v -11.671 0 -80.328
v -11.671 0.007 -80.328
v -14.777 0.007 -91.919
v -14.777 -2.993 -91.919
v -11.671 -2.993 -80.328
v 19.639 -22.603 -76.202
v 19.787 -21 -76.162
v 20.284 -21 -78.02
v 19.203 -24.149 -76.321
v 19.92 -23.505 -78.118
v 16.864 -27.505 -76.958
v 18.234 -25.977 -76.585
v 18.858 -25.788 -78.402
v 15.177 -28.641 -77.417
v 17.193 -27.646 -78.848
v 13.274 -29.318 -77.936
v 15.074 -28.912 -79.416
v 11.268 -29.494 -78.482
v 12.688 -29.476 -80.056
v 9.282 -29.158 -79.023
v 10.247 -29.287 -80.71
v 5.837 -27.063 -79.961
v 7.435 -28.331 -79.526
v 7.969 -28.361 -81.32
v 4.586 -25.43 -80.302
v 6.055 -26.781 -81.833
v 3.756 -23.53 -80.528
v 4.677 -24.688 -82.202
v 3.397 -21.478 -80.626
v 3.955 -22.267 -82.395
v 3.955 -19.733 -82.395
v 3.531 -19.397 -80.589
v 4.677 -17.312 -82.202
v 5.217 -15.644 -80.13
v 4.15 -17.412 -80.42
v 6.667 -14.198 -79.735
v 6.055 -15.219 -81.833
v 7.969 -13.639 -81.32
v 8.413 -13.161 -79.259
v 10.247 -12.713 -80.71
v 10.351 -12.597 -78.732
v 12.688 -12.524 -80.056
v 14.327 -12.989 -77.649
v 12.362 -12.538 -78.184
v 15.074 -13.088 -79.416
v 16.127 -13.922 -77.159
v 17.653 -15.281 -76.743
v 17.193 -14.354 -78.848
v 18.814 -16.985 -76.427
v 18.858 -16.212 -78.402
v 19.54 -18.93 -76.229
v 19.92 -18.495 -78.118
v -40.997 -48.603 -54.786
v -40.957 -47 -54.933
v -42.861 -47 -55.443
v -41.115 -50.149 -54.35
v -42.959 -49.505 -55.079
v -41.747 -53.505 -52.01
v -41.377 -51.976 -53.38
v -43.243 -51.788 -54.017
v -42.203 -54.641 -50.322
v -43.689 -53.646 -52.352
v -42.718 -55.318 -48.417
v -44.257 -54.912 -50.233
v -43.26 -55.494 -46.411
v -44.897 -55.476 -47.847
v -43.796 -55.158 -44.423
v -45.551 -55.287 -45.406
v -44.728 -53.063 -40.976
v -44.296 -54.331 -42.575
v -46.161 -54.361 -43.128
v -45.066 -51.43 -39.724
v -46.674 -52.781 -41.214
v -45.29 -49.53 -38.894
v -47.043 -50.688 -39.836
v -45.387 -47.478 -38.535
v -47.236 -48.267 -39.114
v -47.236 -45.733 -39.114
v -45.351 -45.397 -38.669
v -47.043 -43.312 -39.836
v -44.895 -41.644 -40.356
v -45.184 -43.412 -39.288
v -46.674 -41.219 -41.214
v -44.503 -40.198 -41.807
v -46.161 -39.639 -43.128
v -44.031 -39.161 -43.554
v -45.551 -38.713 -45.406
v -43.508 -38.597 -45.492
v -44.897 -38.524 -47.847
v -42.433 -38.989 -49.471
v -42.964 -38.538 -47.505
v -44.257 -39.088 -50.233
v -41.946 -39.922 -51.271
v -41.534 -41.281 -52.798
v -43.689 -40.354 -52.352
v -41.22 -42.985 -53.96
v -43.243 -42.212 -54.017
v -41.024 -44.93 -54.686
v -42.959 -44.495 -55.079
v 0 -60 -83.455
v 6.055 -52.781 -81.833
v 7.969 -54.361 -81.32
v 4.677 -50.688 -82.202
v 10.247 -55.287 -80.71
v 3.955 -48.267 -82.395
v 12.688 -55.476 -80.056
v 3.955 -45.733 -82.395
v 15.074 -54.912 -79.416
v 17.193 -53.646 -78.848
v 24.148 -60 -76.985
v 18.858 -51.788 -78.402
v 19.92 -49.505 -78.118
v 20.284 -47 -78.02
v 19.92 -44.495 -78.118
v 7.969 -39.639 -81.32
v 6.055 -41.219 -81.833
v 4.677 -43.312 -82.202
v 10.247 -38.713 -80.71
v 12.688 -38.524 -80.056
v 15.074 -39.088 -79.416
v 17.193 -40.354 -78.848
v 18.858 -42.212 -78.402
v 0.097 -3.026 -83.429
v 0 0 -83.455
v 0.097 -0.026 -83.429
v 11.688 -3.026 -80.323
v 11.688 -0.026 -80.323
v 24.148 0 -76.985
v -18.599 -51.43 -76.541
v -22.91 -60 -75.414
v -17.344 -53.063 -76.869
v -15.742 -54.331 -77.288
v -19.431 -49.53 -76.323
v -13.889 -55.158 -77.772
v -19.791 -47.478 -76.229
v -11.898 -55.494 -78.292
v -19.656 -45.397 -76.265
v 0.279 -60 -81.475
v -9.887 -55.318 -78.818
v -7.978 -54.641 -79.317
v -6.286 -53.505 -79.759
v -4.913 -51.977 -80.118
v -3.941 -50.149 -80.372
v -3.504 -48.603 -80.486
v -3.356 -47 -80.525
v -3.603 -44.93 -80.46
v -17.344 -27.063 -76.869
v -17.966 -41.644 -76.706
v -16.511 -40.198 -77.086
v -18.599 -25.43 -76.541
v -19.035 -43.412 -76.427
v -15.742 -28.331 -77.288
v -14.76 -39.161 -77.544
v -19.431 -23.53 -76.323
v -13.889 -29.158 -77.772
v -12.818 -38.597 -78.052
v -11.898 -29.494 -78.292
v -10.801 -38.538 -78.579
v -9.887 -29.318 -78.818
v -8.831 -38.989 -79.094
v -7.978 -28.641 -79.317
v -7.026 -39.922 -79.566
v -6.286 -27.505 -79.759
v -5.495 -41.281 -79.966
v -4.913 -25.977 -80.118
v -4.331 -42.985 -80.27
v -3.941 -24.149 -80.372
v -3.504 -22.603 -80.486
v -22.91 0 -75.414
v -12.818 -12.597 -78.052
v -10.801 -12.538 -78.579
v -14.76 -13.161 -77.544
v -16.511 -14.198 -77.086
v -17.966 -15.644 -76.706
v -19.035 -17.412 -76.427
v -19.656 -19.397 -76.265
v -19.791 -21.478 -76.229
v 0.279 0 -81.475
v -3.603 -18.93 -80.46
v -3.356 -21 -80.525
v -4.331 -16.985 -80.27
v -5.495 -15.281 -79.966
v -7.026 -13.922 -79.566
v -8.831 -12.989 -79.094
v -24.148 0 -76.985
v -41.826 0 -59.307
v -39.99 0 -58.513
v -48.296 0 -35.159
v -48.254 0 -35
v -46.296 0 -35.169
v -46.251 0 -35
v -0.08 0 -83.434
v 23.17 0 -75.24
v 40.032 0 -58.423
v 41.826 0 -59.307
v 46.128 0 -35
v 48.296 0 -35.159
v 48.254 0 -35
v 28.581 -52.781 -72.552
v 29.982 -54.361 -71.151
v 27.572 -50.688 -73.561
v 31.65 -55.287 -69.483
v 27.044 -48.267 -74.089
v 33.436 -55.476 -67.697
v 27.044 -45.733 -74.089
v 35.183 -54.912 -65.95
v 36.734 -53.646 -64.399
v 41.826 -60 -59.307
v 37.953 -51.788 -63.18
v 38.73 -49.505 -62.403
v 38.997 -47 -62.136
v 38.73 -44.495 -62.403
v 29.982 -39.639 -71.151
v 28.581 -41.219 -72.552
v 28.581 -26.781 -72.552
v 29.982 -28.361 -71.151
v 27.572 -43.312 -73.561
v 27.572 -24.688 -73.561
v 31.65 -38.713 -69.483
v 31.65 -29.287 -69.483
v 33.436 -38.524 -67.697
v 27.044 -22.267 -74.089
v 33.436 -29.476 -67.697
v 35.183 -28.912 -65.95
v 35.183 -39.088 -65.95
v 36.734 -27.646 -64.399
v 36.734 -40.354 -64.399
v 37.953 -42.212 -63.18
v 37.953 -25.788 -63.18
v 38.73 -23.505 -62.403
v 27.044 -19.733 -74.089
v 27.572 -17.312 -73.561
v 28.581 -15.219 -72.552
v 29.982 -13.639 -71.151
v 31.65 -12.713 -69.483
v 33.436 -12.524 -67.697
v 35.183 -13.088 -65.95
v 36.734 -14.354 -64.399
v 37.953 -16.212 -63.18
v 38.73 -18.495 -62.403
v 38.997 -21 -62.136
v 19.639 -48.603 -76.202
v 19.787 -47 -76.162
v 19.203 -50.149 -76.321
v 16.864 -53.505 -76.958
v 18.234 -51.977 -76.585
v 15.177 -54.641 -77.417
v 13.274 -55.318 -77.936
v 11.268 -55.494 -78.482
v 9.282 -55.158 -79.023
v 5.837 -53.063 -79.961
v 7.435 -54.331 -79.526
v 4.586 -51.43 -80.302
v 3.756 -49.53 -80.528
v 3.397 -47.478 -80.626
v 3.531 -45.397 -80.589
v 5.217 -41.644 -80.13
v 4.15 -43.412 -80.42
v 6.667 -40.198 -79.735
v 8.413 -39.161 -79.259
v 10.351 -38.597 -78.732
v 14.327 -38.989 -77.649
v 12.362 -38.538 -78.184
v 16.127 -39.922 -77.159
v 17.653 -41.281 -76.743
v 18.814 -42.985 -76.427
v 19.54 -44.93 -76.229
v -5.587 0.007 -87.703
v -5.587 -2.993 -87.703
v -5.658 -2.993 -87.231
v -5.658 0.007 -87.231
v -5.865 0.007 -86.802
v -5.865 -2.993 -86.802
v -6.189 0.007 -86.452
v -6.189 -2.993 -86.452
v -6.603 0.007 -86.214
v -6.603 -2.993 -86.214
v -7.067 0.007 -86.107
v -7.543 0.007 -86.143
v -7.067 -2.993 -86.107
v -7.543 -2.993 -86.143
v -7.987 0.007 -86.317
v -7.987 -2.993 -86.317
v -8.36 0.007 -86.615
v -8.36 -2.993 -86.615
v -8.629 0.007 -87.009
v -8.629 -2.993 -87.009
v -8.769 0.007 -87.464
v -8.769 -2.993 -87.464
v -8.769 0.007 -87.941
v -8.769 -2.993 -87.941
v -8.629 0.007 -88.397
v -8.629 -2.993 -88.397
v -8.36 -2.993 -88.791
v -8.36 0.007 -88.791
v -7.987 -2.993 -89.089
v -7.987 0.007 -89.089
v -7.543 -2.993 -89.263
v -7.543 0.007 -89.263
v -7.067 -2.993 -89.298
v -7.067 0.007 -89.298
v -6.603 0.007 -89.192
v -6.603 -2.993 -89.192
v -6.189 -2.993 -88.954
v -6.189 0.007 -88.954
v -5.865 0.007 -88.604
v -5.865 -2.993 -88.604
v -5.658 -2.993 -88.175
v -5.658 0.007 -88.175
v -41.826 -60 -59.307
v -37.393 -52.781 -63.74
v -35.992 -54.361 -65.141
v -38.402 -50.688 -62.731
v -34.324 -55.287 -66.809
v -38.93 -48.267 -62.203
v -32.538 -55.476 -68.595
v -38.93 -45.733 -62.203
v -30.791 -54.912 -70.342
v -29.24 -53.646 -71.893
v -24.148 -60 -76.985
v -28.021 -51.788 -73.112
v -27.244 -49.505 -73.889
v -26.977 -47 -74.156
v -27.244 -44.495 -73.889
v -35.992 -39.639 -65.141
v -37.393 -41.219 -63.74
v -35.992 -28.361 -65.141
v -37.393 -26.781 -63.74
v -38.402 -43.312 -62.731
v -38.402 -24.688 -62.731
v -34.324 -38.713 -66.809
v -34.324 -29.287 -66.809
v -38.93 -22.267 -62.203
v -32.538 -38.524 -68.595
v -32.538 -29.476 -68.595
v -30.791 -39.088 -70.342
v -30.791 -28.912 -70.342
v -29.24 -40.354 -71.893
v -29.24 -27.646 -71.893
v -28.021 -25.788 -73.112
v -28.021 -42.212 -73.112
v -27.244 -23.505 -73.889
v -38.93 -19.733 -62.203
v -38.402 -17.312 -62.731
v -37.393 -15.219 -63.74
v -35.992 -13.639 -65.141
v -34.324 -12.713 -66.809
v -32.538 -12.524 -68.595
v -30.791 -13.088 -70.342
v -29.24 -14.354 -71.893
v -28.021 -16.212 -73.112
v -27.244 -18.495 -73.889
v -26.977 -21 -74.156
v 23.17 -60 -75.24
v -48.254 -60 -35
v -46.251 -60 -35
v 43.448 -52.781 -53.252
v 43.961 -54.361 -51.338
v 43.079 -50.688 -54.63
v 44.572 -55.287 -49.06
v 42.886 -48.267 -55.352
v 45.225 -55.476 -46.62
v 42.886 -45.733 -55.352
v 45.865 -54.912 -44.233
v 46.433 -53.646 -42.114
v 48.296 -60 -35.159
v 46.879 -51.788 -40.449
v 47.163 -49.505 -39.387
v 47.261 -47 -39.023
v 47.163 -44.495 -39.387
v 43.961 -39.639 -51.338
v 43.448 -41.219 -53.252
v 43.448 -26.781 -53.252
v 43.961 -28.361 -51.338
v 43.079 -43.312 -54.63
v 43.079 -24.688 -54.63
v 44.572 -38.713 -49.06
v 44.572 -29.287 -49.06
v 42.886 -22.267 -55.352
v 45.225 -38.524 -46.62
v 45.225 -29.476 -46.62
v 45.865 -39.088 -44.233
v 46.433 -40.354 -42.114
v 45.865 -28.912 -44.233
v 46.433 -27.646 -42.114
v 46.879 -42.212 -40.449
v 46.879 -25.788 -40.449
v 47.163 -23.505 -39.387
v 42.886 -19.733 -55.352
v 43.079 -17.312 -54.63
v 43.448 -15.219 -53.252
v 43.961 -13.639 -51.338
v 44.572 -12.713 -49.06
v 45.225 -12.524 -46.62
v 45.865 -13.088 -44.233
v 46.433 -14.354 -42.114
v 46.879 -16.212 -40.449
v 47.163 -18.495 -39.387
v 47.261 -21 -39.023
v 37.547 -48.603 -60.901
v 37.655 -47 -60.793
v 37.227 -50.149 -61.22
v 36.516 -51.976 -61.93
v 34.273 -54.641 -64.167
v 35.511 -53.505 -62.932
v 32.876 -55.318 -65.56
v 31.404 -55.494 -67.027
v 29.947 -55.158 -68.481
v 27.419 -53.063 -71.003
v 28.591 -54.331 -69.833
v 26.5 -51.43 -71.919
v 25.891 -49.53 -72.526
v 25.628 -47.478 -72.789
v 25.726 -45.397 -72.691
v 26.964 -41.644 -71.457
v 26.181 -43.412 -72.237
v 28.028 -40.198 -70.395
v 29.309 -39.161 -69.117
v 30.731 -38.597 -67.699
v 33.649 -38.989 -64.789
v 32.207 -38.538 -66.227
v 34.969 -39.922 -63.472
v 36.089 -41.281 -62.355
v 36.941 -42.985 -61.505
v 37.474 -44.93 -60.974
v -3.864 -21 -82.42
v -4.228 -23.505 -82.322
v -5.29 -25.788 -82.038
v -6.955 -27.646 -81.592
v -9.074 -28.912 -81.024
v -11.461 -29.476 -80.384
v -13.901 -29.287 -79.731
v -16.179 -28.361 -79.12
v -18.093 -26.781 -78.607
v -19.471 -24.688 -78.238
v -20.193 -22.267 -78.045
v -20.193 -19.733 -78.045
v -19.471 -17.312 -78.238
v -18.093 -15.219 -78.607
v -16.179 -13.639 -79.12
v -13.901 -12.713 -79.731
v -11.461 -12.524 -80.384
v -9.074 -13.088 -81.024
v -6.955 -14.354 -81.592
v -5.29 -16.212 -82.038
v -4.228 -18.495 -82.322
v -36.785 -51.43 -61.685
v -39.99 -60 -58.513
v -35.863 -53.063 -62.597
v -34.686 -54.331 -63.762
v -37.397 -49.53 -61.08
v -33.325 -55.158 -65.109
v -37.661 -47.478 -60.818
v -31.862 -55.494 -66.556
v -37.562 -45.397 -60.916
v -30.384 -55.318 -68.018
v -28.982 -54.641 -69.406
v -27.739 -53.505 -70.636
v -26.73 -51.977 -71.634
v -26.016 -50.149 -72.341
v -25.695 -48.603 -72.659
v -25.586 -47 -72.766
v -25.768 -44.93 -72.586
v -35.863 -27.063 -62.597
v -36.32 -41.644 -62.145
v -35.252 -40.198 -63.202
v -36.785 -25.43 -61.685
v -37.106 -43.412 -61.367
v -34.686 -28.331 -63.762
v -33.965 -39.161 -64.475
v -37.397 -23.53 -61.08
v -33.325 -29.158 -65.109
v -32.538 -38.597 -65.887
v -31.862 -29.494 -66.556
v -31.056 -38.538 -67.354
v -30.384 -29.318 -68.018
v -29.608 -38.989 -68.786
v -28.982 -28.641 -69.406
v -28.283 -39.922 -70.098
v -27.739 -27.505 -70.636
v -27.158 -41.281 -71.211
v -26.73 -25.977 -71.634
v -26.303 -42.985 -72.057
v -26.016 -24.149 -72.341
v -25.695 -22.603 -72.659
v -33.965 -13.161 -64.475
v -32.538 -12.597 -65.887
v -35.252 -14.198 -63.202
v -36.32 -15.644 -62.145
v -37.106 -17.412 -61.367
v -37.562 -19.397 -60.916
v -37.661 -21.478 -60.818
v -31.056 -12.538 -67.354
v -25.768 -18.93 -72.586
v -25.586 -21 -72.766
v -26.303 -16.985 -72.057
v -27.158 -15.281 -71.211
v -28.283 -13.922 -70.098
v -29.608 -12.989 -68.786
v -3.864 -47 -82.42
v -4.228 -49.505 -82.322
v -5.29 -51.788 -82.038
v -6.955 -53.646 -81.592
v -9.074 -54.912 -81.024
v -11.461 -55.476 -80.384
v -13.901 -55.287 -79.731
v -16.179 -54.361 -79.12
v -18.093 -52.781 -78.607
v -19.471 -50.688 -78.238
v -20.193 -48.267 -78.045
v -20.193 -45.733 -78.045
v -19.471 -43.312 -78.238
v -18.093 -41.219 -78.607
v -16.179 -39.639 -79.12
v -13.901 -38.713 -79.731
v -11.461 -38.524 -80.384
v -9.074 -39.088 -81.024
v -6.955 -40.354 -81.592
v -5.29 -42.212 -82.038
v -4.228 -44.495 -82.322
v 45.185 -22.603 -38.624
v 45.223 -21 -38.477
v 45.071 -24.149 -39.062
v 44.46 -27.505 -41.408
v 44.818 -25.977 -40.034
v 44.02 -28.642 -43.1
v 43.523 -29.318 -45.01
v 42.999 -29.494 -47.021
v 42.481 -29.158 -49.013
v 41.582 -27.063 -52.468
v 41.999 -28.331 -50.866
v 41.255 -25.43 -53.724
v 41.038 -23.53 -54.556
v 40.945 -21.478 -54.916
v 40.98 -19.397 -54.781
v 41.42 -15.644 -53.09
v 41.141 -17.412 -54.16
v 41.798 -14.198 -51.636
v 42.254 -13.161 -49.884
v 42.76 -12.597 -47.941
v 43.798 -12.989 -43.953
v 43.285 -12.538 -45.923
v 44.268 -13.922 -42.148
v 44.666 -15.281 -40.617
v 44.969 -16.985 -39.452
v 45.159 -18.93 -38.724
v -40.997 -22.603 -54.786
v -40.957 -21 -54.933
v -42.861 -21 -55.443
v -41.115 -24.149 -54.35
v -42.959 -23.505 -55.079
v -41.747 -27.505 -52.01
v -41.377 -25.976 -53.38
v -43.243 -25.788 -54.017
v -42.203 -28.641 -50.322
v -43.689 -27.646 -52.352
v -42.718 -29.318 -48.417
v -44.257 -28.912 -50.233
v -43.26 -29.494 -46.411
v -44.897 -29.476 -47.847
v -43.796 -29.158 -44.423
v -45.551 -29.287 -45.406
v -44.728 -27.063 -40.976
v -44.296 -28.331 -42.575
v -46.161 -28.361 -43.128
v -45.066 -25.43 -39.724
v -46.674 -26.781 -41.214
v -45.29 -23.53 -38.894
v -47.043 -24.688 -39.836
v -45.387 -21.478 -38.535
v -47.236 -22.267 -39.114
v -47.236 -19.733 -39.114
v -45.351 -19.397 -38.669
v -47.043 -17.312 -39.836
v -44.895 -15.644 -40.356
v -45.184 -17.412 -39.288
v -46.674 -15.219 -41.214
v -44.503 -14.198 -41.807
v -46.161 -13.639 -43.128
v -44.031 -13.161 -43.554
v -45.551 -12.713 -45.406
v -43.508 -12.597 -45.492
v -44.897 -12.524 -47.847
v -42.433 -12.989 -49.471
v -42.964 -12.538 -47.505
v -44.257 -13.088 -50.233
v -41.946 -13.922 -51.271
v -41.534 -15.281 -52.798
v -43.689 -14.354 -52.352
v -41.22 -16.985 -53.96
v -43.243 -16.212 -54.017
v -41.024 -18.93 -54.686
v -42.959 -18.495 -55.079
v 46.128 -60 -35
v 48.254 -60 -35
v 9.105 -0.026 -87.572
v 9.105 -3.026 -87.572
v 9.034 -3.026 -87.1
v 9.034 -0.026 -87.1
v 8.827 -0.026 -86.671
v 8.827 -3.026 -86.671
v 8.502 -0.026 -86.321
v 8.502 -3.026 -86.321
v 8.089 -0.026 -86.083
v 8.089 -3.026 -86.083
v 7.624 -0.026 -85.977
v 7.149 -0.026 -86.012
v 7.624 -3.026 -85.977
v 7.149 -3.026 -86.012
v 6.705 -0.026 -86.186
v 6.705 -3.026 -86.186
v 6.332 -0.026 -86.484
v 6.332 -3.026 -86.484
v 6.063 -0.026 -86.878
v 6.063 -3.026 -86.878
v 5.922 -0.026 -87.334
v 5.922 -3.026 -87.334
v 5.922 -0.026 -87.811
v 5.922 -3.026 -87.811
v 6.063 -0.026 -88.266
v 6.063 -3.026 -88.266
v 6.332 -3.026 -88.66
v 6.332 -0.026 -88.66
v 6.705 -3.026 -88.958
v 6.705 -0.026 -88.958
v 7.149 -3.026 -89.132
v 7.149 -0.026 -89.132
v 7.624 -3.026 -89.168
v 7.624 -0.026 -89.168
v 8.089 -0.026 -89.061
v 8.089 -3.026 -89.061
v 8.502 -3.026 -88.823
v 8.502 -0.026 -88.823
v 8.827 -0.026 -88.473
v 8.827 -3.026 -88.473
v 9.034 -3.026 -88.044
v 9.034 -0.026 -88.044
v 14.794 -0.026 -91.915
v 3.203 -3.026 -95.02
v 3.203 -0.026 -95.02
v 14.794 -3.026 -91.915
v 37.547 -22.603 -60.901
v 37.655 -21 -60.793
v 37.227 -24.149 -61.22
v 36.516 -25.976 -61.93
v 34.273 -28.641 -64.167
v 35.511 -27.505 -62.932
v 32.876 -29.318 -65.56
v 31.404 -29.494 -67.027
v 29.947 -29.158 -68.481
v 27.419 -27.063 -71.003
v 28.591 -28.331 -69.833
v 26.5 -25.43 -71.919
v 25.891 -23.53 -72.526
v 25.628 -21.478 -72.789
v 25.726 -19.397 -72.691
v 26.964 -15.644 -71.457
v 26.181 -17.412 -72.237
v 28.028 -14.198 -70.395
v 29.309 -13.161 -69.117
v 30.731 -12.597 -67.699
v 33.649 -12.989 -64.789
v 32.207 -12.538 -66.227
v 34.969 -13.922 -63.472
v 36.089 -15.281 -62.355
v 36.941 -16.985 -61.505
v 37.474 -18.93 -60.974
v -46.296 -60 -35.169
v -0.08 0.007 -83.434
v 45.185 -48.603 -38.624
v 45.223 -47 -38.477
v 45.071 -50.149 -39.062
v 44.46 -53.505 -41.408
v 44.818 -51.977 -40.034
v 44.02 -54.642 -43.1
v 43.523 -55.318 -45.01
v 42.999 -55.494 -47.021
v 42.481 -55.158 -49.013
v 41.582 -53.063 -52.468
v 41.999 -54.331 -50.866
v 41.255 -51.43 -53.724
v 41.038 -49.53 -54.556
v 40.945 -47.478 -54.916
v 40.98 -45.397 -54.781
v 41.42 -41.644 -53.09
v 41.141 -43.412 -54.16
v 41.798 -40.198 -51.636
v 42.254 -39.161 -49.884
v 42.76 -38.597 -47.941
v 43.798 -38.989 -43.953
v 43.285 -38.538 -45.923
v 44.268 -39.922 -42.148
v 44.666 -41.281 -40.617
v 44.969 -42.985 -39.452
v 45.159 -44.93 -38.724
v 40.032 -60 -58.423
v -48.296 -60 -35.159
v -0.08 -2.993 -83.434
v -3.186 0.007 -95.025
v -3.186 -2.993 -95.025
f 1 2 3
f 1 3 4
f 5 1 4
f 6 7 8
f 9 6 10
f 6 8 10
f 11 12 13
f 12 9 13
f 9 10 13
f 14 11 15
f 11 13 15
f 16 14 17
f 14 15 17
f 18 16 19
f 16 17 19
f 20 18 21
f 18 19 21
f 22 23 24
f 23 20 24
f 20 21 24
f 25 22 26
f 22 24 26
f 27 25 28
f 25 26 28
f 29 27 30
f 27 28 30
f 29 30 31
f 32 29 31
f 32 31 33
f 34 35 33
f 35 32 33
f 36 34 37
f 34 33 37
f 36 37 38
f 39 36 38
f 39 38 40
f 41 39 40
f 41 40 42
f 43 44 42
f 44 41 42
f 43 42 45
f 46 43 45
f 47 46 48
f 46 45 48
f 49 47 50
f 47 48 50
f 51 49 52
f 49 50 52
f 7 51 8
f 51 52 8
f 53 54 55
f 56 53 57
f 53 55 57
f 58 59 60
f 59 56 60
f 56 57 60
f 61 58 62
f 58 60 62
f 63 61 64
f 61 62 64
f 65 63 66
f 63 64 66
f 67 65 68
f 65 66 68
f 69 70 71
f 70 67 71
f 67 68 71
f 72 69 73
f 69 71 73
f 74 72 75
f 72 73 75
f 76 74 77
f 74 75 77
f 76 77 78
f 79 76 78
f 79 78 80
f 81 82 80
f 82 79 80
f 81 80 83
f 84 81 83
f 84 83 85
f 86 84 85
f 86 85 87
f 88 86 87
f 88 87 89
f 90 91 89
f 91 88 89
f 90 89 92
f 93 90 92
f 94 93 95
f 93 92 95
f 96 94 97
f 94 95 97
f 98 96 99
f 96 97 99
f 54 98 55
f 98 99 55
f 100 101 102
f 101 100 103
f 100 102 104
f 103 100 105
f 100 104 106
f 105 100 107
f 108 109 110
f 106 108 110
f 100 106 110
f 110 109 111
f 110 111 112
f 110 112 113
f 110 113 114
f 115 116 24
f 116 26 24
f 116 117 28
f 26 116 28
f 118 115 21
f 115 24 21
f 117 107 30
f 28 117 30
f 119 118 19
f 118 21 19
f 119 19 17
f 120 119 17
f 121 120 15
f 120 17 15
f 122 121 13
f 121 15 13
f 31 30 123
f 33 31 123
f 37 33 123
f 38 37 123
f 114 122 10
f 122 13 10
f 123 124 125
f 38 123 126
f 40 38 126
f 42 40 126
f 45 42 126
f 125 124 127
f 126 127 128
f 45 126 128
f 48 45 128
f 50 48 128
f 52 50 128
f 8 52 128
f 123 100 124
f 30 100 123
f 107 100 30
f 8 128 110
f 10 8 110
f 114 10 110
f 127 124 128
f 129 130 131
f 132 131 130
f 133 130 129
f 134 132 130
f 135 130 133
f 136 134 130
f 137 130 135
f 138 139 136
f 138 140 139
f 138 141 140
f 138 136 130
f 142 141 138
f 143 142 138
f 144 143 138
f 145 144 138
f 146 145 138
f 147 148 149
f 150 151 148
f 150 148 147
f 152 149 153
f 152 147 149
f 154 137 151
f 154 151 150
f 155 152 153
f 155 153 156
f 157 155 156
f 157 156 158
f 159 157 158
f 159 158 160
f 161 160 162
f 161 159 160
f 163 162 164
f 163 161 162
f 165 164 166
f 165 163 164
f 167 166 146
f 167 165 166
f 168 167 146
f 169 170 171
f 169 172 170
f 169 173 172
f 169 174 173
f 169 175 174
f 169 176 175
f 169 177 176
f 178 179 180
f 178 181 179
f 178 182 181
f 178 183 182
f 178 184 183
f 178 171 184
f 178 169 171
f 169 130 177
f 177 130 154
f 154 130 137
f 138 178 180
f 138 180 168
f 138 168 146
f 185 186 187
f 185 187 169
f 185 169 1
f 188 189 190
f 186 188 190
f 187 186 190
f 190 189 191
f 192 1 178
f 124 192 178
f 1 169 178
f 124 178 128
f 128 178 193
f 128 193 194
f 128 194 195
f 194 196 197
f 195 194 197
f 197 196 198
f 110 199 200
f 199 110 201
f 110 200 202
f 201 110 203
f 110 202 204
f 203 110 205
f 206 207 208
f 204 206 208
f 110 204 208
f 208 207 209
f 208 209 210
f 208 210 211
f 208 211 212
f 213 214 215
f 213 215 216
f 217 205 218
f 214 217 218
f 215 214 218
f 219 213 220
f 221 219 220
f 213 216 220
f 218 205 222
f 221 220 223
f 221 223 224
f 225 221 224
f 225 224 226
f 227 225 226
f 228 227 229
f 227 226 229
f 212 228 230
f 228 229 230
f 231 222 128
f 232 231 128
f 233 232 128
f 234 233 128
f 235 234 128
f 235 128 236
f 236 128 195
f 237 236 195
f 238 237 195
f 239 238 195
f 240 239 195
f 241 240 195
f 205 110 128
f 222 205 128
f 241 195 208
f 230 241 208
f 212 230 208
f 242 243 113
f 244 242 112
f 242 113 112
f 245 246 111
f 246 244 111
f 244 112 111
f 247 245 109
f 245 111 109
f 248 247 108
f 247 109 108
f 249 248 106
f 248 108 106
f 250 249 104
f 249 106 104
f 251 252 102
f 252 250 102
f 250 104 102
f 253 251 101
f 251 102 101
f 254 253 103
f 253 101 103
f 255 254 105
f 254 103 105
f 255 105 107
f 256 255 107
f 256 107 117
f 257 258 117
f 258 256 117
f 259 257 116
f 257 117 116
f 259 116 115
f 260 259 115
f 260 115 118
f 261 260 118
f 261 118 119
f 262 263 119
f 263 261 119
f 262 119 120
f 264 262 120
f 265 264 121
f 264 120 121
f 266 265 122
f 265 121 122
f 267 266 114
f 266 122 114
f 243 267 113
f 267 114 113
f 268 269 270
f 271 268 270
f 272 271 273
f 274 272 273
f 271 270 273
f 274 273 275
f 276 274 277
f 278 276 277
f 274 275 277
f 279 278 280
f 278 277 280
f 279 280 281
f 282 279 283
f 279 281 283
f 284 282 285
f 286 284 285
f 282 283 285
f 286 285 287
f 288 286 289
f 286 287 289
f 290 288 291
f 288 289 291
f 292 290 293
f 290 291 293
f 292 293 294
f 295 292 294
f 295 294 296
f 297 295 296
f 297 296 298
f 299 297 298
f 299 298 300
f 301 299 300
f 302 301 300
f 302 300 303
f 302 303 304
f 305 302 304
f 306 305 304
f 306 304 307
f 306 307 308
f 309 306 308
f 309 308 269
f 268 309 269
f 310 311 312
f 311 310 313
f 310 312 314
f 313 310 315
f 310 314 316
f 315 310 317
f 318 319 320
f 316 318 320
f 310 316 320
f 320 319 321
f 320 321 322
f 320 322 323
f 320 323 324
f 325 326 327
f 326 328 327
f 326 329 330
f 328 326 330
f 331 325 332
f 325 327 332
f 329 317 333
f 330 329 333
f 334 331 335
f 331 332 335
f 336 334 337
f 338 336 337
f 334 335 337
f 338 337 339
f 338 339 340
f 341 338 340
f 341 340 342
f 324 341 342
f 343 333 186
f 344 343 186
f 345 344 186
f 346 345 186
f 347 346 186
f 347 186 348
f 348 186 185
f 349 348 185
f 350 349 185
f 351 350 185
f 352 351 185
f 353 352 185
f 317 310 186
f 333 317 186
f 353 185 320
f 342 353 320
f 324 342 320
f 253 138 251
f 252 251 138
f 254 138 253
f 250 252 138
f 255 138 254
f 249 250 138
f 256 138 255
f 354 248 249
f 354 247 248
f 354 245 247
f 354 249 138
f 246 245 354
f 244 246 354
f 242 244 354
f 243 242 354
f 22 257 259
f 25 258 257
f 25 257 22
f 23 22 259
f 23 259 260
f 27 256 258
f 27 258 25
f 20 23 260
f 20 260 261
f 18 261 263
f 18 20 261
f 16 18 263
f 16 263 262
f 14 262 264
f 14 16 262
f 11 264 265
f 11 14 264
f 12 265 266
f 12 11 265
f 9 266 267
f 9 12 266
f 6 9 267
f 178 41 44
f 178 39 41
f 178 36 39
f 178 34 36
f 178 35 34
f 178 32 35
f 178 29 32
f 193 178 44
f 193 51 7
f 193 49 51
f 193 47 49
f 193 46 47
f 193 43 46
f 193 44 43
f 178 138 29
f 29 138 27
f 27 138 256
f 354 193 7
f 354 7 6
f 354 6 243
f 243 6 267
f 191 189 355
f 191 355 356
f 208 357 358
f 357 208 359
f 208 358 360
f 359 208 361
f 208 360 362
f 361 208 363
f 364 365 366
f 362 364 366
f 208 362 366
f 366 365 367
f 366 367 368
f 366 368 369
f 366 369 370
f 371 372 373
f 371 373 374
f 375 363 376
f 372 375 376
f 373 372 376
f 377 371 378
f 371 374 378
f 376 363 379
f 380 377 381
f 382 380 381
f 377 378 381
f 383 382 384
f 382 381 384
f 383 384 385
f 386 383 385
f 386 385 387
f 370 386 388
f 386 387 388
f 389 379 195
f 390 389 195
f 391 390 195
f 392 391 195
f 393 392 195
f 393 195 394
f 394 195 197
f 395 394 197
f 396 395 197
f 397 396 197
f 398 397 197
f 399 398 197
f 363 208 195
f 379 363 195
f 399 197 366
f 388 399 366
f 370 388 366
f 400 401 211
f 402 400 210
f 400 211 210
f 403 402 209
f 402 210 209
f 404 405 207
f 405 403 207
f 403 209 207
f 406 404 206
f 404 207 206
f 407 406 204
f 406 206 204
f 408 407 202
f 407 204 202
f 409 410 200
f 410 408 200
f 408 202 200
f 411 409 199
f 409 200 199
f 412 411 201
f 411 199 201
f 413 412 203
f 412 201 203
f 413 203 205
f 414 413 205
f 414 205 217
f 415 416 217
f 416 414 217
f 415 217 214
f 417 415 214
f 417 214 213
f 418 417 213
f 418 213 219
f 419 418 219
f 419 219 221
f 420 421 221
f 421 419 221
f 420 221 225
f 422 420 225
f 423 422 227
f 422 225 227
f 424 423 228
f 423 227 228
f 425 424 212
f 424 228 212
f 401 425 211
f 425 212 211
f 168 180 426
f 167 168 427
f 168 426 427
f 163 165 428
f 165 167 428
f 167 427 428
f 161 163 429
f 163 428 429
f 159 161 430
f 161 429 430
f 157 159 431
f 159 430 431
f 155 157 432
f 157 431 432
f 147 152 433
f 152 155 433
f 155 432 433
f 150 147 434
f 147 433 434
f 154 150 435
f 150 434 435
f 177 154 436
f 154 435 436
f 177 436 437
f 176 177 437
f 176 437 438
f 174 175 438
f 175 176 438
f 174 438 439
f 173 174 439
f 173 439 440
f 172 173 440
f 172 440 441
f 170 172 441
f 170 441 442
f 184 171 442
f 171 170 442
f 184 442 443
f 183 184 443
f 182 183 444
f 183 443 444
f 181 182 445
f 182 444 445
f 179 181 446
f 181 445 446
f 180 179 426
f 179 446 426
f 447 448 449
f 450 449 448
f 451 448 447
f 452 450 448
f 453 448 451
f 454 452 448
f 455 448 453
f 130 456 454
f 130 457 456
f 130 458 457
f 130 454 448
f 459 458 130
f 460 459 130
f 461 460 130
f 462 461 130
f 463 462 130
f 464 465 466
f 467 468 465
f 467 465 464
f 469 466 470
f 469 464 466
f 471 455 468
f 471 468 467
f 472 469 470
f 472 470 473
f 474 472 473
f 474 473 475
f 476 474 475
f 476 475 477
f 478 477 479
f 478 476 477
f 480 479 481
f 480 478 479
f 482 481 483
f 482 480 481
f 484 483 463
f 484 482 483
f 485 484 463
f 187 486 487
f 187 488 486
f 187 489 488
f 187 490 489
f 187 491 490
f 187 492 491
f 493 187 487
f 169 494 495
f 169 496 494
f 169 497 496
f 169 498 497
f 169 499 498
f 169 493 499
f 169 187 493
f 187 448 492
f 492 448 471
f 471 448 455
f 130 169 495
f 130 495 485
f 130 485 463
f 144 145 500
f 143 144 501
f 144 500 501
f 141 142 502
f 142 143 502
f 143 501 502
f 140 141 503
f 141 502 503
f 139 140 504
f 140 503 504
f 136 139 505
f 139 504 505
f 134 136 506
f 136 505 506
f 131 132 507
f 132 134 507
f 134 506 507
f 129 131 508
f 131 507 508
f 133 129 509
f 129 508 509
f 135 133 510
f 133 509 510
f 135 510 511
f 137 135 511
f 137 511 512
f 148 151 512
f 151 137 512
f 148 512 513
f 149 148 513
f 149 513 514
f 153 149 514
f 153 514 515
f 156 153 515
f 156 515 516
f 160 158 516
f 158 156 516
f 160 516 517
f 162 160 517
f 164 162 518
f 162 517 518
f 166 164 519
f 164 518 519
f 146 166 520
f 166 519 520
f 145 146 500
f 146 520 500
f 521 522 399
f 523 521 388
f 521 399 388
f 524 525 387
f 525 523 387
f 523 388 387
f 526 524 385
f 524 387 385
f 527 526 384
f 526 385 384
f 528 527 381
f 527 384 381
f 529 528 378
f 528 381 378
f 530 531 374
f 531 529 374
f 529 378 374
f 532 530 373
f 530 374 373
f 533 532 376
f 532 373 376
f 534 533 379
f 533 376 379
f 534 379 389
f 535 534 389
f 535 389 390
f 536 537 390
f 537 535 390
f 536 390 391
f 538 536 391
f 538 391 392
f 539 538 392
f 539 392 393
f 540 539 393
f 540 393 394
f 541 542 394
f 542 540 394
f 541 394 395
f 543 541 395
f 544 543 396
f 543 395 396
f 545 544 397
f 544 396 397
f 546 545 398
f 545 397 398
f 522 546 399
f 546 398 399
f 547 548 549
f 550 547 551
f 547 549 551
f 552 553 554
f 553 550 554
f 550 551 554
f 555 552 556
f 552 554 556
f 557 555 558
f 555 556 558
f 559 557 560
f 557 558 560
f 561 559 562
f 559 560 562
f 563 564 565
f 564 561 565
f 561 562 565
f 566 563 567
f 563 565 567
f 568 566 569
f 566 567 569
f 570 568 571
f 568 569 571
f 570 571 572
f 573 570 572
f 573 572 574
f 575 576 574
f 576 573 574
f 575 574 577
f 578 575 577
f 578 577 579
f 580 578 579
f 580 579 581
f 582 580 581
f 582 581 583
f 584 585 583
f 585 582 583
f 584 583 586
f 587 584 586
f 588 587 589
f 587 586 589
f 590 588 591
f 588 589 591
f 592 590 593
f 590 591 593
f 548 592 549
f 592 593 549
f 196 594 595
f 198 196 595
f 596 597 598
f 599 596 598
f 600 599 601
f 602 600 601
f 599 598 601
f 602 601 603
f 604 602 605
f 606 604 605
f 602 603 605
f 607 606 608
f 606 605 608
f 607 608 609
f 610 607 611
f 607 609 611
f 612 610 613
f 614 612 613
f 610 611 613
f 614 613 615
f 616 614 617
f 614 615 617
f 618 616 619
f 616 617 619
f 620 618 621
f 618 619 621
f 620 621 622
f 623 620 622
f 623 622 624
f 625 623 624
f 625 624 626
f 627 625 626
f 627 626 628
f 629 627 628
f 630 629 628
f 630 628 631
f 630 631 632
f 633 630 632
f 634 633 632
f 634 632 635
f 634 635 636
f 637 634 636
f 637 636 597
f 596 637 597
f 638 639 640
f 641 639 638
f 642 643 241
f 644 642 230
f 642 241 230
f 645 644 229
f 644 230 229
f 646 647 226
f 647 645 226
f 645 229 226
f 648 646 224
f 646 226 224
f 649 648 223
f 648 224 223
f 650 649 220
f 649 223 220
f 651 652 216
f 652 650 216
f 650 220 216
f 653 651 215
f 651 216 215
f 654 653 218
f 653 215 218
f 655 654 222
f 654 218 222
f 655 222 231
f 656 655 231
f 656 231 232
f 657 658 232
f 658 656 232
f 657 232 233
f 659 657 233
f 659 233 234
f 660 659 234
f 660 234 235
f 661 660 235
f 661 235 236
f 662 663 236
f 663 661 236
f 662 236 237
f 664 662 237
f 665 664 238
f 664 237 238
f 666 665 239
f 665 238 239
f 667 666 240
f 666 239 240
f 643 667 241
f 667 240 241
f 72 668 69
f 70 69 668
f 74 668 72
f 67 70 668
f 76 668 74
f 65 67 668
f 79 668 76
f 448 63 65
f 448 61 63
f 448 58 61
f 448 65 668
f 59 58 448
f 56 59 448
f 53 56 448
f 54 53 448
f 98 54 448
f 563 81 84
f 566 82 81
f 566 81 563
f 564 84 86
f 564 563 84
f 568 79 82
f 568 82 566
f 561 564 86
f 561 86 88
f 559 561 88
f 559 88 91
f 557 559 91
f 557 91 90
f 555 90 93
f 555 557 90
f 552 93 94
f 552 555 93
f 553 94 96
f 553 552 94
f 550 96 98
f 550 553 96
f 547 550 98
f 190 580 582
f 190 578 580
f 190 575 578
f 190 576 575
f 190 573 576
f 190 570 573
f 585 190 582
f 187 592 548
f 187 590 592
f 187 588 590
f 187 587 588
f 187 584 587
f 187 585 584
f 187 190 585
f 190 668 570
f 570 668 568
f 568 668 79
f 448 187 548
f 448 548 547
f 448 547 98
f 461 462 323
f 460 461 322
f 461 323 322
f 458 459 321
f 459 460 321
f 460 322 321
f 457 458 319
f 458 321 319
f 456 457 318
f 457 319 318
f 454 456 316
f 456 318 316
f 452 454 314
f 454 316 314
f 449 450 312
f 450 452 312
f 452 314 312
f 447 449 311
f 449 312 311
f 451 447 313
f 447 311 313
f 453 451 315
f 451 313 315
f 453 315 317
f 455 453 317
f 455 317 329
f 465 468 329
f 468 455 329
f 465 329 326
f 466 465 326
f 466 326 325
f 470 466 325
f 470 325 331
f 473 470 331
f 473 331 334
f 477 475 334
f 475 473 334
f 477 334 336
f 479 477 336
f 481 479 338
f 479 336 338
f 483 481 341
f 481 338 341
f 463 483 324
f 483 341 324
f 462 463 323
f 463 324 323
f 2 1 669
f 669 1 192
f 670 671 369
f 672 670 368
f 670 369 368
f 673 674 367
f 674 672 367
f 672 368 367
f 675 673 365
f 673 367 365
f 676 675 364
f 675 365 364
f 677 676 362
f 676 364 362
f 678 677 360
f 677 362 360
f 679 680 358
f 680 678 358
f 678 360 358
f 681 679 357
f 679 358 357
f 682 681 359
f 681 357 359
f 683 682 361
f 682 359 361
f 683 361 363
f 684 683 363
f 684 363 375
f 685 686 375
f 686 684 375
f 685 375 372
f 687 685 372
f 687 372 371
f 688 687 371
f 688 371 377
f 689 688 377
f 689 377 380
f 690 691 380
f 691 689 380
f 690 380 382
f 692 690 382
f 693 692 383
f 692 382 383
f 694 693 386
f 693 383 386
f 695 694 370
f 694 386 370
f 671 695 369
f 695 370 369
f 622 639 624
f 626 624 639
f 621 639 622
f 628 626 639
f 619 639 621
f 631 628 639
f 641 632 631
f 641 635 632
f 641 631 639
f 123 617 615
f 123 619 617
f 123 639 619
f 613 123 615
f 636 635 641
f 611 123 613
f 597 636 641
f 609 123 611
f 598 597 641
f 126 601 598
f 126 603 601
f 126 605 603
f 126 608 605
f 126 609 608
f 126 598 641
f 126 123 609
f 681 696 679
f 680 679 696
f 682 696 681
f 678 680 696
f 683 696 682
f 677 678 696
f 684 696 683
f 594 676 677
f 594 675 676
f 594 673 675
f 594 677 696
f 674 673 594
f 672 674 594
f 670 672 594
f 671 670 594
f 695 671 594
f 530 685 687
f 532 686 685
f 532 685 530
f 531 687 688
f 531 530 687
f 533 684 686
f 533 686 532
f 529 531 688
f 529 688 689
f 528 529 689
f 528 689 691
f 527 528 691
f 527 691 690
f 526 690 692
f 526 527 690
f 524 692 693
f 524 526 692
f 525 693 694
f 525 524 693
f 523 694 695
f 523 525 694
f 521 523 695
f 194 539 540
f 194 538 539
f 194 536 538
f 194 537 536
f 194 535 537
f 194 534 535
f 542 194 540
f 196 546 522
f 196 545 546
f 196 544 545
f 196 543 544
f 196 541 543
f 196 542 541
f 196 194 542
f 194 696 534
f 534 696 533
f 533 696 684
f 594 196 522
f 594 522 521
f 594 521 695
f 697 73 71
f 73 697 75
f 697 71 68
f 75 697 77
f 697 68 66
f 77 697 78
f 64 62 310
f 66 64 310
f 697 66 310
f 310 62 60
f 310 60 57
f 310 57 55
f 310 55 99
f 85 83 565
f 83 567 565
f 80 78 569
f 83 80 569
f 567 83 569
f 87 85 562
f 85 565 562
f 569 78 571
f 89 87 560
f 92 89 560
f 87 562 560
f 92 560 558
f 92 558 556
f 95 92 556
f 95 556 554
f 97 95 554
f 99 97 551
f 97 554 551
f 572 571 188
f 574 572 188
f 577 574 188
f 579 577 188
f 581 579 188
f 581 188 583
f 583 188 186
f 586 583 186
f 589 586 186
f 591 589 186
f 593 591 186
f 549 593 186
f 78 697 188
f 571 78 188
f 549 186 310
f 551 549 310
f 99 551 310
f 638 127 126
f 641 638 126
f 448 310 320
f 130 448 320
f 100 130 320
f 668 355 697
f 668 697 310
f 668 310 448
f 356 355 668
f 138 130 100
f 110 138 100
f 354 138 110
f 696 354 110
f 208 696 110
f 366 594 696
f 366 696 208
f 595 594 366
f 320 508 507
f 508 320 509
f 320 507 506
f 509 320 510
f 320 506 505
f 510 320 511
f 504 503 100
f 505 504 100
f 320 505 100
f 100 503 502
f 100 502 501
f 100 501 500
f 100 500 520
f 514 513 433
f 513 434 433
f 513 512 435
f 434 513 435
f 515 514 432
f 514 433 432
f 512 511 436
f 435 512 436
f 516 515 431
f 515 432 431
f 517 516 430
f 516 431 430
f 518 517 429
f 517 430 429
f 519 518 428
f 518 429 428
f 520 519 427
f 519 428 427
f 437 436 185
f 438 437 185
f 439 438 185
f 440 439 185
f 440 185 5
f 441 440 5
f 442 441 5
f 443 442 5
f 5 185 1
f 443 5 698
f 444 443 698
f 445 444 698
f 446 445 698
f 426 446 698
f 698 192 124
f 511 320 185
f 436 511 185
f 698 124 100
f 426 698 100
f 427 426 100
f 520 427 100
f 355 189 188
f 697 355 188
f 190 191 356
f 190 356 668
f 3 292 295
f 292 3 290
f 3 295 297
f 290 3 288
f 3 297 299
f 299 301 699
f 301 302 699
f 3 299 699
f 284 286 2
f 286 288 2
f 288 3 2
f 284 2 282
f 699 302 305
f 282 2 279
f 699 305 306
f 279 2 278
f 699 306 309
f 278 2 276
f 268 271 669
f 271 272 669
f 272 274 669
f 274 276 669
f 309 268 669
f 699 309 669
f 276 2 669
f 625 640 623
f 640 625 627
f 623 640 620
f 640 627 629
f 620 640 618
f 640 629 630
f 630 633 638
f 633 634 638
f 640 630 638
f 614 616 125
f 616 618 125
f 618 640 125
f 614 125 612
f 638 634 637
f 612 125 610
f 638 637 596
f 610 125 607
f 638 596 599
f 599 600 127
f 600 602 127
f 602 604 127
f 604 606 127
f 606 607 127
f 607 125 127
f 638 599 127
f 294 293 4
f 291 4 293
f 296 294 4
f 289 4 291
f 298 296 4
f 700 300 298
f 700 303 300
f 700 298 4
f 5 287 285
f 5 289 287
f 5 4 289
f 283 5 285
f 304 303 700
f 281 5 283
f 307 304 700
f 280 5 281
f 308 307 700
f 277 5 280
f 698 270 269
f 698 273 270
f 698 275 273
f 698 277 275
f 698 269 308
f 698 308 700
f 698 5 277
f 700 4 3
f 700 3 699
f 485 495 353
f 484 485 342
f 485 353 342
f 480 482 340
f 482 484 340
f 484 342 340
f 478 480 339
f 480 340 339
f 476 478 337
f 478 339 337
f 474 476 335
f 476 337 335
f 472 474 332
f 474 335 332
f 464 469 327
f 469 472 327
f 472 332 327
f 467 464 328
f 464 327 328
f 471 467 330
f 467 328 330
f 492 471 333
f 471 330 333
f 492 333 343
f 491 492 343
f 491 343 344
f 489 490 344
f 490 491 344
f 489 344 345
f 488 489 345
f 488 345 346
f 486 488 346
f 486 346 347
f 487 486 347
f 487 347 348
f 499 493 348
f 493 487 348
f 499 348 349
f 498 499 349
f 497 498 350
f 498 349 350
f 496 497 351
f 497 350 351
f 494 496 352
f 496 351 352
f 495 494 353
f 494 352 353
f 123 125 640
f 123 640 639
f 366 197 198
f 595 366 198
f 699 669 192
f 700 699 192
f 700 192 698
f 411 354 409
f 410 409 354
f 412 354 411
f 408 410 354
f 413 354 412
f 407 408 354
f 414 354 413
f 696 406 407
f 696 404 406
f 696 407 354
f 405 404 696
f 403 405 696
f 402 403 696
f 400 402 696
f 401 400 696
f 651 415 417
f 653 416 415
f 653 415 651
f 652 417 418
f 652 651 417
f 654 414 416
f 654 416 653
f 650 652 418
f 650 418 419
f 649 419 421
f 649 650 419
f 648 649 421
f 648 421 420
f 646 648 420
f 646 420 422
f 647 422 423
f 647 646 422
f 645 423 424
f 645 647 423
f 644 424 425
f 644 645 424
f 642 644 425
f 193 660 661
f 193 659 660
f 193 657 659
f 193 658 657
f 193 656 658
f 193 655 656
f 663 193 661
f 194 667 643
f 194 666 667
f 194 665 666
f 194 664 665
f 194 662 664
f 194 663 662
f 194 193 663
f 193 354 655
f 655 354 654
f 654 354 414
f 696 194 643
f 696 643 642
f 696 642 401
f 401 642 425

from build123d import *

# Parameters (mm, degrees)
BOX_W           = 100
BOX_H           = 63
BOX_DEPTH       = 57
PAD_DEPTH       = 60
POCKET_DEPTH    = 60
SKETCH002_R     = 8.5
POCKET001_DEPTH = 5
SKETCH003_R     = 8.5
POCKET002_DEPTH = 5
SKETCH004_R     = 8.5
POCKET003_DEPTH = 5
SKETCH005_R     = 8.5
POCKET004_DEPTH = 5
SKETCH006_R     = 8.5
POCKET005_DEPTH = 5
SKETCH007_R     = 8.5
POCKET006_DEPTH = 5
SKETCH008_W     = 12
SKETCH008_H     = 3
PAD001_DEPTH    = 12
SKETCH009_W     = 12
SKETCH009_H     = 3
PAD002_DEPTH    = 12
SKETCH010_R     = 1.6
POCKET007_DEPTH = 5


with BuildPart() as cubo:
    # Box → Box (new body)
    with BuildSketch(Plane(origin=(-50, -62, -35), x_dir=(1, 0, 0), z_dir=(0, 0, 1))):
        with Locations((50, 31.5)):
            Rectangle(BOX_W, BOX_H)
    extrude(amount=BOX_DEPTH)


with BuildPart() as cut:
    # Sketch → Pad (new body)
    with BuildSketch(Plane.XZ):
        Polygon((0, 13.1372921726), (-24.1481456572, 6.666816045), (-41.8258151869, -11.0108534847), (-48.2962913145, -35.1589991419), (-41.8258151869, -59.3071447991), (-24.1481456572, -76.9848143288), (0, -83.4552904564), (24.1481456572, -76.9848143288), (41.8258151869, -59.3071447991), (48.2962913145, -35.1589991419), (41.8258151869, -11.0108534847), (24.1481456572, 6.666816045), align=None)
    extrude(amount=PAD_DEPTH)

    # Sketch001 (on Face13 of Pad) → Pocket (cut)
    with BuildSketch(Plane(origin=(0, 0, 0), x_dir=(1, 0, 0), z_dir=(0, 1, 0))):
        Polygon((0.2789274024, 81.4748360882), (23.1696976244, 75.2404980022), (40.0320556094, 58.422596), (46.1550508689, 34.895187618), (40.0872400093, 11.9994668326), (23.2933636529, -4.8586822764), (-0.3577352301, -11.1695458715), (-23.1458968596, -4.9360655293), (-40.0016837516, 11.8309415939), (-46.2963180976, 35.1693495985), (-39.9901052234, 58.5133129971), (-22.9100181577, 75.4141328541), align=None)
    extrude(amount=-POCKET_DEPTH, mode=Mode.SUBTRACT)

    # Sketch002 (on Face11 of Pocket) → Pocket001 (cut)
    with BuildSketch(Plane(origin=(-50.566479993, 0, -50.566479993), x_dir=(0.7071067812, 0, -0.7071067812), z_dir=(-0.7071067812, 0, -0.7071067812))):
        with Locations((24.861166713, 47)):
            Circle(SKETCH002_R)
        with Locations((24.861166713, 21)):
            Circle(SKETCH002_R)
    extrude(amount=-POCKET001_DEPTH, mode=Mode.SUBTRACT)

    # Sketch003 (on Face13 of Pocket001) → Pocket002 (cut)
    with BuildSketch(Plane(origin=(-20.8638226141, 0, -77.8648460359), x_dir=(0.9659258263, 0, -0.2588190451), z_dir=(-0.2588190451, 0, -0.9659258263))):
        with Locations((9.0998185847, 47)):
            Circle(SKETCH003_R)
        with Locations((9.0998185847, 21)):
            Circle(SKETCH003_R)
    extrude(amount=-POCKET002_DEPTH, mode=Mode.SUBTRACT)

    # Sketch004 (on Face14 of Pocket002) → Pocket003 (cut)
    with BuildSketch(Plane(origin=(20.8638226141, 0, -77.8648460359), x_dir=(0.9659258263, 0, 0.2588190451), z_dir=(0.2588190451, 0, -0.9659258263))):
        with Locations((-9.0998185847, 47)):
            Circle(SKETCH004_R)
        with Locations((-9.0998185847, 21)):
            Circle(SKETCH004_R)
    extrude(amount=-POCKET003_DEPTH, mode=Mode.SUBTRACT)

    # Sketch005 (on Face12 of Pocket003) → Pocket004 (cut)
    with BuildSketch(Plane(origin=(50.566479993, 0, -50.566479993), x_dir=(0.7071067812, 0, 0.7071067812), z_dir=(0.7071067812, 0, -0.7071067812))):
        with Locations((-24.861166713, 47)):
            Circle(SKETCH005_R)
        with Locations((-24.861166713, 21)):
            Circle(SKETCH005_R)
    extrude(amount=-POCKET004_DEPTH, mode=Mode.SUBTRACT)

    # Sketch006 (on Face10 of Pocket004) → Pocket005 (cut)
    with BuildSketch(Plane(origin=(53.8508030361, 0, -14.4292791853), x_dir=(0.2588190451, 0, 0.9659258263), z_dir=(0.9659258263, 0, -0.2588190451))):
        with Locations((-33.9609852976, 47)):
            Circle(SKETCH006_R)
        with Locations((-33.9609852976, 21)):
            Circle(SKETCH006_R)
    extrude(amount=-POCKET005_DEPTH, mode=Mode.SUBTRACT)

    # Sketch007 (on Face9 of Pocket005) → Pocket006 (cut)
    with BuildSketch(Plane(origin=(-53.8508030361, 0, -14.4292791853), x_dir=(0.2588190451, 0, -0.9659258263), z_dir=(-0.9659258263, 0, -0.2588190451))):
        with Locations((33.9609852976, 47)):
            Circle(SKETCH007_R)
        with Locations((33.9609852976, 21)):
            Circle(SKETCH007_R)
    extrude(amount=-POCKET006_DEPTH, mode=Mode.SUBTRACT)

    # Sketch008 (on Face14 of Pocket006) → Pad001 (join)
    with BuildSketch(Plane(origin=(20.8638226141, 0, -77.8648460359), x_dir=(0.9659258263, 0, 0.2588190451), z_dir=(0.2588190451, 0, -0.9659258263))):
        with Locations((-15.4992547125, 1.5258008155)):
            Rectangle(SKETCH008_W, SKETCH008_H)
    extrude(amount=PAD001_DEPTH)

    # Sketch009 (on Face13 of Pad001) → Pad002 (join)
    with BuildSketch(Plane(origin=(-20.8638226141, 0, -77.8648460359), x_dir=(0.9659258263, 0, -0.2588190451), z_dir=(-0.2588190451, 0, -0.9659258263))):
        with Locations((15.5166798155, 1.4931005082)):
            Rectangle(SKETCH009_W, SKETCH009_H)
    extrude(amount=PAD002_DEPTH)

    # Sketch010 (on Face42 of Pad002) → Pocket007 (cut)
    with BuildSketch(Plane.XZ.offset(3.0258008155)):
        with Locations((7.5046039895, -87.5720469825)):
            Circle(SKETCH010_R)
        with Locations((-7.1870487225, -87.7029523498)):
            Circle(SKETCH010_R)
    extrude(amount=-POCKET007_DEPTH, mode=Mode.SUBTRACT)

    # Cut: cut Cubo
    add(cubo.part, mode=Mode.SUBTRACT)


solid = cut.part
